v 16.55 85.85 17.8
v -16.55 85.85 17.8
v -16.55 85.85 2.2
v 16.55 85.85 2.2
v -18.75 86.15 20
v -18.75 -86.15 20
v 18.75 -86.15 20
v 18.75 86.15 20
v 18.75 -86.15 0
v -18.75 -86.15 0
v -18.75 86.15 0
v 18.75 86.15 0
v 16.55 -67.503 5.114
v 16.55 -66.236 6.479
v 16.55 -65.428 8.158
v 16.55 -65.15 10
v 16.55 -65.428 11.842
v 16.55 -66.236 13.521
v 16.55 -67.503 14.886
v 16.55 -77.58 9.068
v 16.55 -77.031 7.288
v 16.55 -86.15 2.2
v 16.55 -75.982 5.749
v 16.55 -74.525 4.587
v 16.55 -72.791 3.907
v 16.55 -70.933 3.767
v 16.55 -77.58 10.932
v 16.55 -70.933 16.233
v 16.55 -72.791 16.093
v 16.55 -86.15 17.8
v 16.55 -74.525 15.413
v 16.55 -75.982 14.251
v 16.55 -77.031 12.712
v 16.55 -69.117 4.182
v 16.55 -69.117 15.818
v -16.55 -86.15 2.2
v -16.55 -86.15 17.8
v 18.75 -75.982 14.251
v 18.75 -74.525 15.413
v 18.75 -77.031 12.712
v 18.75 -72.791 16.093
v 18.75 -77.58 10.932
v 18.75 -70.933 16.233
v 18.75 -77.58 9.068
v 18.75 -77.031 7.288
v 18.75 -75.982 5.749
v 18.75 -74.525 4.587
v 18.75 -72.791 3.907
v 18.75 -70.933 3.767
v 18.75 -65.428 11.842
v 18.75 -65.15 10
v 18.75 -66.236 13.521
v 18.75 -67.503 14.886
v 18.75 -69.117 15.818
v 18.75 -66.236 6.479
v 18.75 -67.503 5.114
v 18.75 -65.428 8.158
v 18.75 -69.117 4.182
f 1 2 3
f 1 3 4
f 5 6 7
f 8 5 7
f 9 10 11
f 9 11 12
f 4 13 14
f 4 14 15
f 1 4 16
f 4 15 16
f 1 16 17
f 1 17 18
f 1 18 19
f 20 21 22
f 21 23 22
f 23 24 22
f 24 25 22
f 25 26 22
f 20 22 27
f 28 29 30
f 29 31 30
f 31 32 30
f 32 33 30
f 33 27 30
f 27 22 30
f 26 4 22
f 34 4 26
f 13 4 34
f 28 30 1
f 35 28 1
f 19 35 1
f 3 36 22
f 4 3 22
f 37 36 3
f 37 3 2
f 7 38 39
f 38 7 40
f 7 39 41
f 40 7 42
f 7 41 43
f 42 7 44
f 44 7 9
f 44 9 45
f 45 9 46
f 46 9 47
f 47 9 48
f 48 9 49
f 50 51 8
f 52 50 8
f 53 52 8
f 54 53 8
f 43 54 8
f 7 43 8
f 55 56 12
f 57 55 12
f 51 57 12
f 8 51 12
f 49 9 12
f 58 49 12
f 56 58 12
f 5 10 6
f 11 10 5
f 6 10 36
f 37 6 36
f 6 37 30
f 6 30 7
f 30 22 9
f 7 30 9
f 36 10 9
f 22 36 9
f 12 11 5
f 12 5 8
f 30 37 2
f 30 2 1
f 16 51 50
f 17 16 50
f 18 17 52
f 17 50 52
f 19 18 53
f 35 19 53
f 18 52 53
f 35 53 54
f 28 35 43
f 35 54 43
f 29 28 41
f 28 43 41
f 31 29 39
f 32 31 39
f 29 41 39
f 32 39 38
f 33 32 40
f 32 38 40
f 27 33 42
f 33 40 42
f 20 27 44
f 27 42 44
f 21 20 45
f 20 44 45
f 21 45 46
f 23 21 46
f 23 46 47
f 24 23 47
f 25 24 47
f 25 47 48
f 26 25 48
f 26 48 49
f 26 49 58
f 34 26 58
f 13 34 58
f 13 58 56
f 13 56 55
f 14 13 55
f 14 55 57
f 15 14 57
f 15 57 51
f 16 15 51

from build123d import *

# Parameters (mm, degrees)
SKETCH_W        = 37.5
SKETCH_H        = 172.3
PAD_DEPTH       = 20
SKETCH001_W     = 33.1
SKETCH001_H     = 15.6
POCKET_DEPTH    = 172
SKETCH002_R     = 6.25
POCKET001_DEPTH = 10


with BuildPart() as part:
    # Sketch → Pad (new body)
    with BuildSketch(Plane.XY):
        Rectangle(SKETCH_W, SKETCH_H)
    extrude(amount=PAD_DEPTH)

    # Sketch001 (on Face1 of Pad) → Pocket (cut)
    with BuildSketch(Plane.XZ.offset(86.15)):
        with Locations((0, 10)):
            Rectangle(SKETCH001_W, SKETCH001_H)
    extrude(amount=-POCKET_DEPTH, mode=Mode.SUBTRACT)

    # Sketch002 (on Face5 of Pocket) → Pocket001 (cut)
    with BuildSketch(Plane.YZ.offset(18.75)):
        with Locations((-71.4, 10)):
            Circle(SKETCH002_R)
    extrude(amount=-POCKET001_DEPTH, mode=Mode.SUBTRACT)


solid = part.part
